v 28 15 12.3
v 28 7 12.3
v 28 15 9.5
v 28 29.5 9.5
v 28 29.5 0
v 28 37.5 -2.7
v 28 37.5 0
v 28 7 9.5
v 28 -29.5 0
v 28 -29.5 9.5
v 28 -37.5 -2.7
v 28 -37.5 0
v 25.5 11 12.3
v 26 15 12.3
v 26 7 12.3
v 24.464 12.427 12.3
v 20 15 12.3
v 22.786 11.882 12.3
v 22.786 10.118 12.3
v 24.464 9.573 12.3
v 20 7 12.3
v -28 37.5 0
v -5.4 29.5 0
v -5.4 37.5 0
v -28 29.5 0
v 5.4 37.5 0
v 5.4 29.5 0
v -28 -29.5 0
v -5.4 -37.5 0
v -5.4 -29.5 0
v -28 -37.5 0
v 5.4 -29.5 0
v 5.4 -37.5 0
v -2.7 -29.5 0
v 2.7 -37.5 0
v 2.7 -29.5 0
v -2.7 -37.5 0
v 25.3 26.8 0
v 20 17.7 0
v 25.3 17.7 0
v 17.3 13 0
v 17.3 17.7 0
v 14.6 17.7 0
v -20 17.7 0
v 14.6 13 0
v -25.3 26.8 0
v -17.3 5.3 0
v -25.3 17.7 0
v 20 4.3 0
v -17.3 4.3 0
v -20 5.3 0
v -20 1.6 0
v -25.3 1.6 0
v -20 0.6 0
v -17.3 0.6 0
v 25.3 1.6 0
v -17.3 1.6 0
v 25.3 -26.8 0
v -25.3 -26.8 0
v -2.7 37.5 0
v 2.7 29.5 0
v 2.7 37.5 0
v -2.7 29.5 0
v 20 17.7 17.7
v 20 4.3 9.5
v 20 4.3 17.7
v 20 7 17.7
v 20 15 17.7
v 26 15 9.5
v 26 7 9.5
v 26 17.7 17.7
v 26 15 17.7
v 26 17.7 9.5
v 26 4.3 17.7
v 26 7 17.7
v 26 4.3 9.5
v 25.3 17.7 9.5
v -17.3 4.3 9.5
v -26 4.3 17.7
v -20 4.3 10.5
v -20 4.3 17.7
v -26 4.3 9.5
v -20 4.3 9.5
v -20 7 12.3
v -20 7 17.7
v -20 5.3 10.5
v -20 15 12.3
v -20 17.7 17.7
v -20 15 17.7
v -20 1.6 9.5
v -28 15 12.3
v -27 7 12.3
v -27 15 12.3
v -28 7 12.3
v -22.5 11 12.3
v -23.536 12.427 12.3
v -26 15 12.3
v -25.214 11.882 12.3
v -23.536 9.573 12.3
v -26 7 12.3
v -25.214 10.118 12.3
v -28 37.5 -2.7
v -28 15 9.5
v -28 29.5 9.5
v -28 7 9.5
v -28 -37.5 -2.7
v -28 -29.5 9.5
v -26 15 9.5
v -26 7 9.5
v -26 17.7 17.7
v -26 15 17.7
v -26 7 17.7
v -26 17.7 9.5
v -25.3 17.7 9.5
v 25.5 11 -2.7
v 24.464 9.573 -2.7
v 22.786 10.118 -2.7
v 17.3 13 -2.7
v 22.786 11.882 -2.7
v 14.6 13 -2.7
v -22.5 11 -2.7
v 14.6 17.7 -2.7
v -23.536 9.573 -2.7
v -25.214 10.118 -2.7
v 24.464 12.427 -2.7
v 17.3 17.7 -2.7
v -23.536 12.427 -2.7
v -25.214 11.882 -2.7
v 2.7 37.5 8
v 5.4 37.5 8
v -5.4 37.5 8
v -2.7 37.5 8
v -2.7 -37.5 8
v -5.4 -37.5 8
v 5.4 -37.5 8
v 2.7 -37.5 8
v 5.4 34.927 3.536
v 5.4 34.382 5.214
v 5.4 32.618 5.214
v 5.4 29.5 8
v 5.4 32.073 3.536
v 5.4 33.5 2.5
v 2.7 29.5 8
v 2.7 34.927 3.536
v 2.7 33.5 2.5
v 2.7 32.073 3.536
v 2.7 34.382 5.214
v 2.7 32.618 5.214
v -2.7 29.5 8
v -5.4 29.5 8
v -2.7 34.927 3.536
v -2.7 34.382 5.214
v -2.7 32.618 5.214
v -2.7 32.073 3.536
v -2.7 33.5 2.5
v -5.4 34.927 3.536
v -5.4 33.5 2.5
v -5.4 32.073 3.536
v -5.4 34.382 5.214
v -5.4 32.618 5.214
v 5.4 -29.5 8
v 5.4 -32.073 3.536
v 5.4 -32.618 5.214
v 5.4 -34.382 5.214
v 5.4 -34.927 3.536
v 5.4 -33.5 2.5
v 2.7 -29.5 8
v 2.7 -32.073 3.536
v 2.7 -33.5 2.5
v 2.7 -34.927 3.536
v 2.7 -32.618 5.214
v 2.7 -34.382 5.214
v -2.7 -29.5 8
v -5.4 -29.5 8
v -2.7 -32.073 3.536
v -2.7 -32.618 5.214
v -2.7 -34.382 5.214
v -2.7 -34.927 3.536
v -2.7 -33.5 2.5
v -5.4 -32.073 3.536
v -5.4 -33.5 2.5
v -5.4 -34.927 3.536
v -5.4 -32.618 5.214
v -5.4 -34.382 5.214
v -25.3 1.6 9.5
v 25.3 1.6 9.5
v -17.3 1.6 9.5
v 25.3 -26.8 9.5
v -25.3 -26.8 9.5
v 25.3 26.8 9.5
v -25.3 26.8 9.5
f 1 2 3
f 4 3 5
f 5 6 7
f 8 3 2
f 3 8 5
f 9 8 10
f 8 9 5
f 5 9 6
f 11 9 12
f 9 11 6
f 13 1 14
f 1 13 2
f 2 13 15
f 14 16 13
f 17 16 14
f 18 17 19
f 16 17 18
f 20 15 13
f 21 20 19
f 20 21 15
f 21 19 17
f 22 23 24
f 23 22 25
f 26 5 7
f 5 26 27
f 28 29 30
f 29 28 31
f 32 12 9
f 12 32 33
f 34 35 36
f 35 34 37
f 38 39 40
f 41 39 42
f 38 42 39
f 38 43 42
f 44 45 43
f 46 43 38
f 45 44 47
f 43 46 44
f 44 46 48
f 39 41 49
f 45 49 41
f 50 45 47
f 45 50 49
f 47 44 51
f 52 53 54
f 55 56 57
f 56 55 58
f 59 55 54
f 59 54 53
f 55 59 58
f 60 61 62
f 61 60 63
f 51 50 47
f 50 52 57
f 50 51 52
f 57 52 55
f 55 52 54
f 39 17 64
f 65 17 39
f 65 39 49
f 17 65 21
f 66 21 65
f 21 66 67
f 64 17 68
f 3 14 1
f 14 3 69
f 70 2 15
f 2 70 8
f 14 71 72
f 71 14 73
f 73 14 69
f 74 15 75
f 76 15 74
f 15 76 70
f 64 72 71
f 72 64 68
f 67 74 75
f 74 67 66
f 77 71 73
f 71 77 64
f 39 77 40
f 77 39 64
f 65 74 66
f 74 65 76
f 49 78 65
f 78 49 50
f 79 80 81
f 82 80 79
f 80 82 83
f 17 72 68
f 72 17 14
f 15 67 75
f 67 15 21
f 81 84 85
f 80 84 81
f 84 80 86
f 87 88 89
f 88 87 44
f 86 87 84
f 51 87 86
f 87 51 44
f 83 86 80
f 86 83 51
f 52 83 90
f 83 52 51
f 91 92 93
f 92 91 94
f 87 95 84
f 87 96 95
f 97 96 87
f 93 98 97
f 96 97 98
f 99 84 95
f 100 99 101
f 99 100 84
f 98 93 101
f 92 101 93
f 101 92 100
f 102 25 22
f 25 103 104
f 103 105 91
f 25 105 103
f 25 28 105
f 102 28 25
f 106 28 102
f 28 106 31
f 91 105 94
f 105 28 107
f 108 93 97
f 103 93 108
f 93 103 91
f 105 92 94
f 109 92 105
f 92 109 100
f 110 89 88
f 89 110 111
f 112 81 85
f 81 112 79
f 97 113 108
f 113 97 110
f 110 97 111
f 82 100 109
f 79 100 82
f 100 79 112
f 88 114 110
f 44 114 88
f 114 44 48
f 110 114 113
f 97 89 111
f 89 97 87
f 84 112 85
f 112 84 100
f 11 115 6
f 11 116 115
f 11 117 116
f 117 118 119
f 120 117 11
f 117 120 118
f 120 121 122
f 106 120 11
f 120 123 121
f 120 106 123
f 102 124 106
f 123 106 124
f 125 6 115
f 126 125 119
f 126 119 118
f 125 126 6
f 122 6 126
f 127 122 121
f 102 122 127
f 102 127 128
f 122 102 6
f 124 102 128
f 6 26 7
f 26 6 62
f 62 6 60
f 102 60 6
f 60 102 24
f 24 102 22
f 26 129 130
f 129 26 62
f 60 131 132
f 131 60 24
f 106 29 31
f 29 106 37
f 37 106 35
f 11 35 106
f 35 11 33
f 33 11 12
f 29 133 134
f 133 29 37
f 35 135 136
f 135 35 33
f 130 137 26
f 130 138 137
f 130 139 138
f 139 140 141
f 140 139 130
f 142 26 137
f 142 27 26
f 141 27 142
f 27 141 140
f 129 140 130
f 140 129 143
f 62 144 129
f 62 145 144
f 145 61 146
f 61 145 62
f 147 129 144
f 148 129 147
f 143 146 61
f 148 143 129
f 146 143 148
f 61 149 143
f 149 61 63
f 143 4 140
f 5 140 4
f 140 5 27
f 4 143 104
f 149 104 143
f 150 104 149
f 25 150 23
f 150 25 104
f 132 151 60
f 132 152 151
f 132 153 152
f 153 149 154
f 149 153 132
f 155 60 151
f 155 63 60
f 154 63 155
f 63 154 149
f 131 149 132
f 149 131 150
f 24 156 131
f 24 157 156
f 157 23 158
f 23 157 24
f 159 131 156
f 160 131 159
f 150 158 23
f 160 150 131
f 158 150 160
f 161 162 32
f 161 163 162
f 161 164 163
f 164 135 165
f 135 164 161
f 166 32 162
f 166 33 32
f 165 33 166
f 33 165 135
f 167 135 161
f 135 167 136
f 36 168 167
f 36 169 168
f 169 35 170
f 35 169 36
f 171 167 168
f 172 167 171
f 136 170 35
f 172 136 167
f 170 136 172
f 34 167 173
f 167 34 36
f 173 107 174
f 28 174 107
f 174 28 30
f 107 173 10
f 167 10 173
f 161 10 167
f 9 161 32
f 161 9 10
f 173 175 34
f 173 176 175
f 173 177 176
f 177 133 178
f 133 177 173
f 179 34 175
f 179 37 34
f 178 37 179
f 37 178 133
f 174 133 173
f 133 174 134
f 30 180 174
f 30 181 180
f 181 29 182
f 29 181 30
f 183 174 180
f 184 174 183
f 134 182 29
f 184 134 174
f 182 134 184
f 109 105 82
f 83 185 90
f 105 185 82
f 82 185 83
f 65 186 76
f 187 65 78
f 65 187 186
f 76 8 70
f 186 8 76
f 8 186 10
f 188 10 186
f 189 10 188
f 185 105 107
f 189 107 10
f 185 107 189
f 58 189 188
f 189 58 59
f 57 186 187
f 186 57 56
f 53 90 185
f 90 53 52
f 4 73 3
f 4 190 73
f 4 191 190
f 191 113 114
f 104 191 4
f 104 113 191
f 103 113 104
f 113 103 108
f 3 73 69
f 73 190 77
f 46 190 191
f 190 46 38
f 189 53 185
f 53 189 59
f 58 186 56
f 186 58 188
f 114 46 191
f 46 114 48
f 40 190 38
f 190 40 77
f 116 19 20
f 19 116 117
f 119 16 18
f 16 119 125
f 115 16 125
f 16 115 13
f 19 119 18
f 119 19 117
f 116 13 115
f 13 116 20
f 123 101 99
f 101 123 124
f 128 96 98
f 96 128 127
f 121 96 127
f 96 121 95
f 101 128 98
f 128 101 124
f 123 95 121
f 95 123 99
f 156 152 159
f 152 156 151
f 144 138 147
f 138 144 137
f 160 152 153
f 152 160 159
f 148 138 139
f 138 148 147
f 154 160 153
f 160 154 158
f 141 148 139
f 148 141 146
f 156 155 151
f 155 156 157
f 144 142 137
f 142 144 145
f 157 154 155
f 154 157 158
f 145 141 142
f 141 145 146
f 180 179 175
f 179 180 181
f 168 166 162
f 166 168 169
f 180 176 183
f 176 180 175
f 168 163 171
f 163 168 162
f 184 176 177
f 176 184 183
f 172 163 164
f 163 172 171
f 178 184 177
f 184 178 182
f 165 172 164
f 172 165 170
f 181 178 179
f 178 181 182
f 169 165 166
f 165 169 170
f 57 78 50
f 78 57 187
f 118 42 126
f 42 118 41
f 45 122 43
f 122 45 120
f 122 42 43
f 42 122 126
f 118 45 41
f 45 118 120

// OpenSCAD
// file: config.scad
//General Config
w_walls=2.7;                //width of the walls
d_screw_h=3;                //screw thread hole
d_screw_p=d_screw_h+0.4;    //screw pass trhougth
h_support=8;                //screw support height
w_support=8;                //screw support width
w_chassis=56;               //chassis with
d_chassis=75;               //chassis depth
h_battery=9.5;              //hight battery

//motor
d_motor=7.6;        //motor diameter
d_motor_shaft=1;    //motor shaft diameter
h_motor=16.60;      //motor height

//motor_housing
w_walls_m=1;                           //with of the walls
gap_housing=3;                         //extra height of the encapsulation
h_motor_body=h_motor+(gap_housing*2);  //motor housing height

//Thrusters
d_motor_t=d_motor+(w_walls_m*2);    //motor support diameter
h_motor_sup=8;                      //motor support height
o_motor=0;                          //motor support distance from ground
d_thruster=34;                      //thruster diameter
h_thruster=30;                      //thruster height

//module propeller
h_propeller=10;     //propeller height
o_propeller=1;      //offset of the blades to shaft
n_blade=3;          //number of blades
s_blade=20;         //angle separation between blades
w_blade=4;          //with of the blades
rounded="empty";      //shape of the blades [round | trian | empty]
// main file
/*
Title:          chassis.scad
Description:    R2B2 nano Chassis
Authors:        Pau Roura (@proura)
Date:           20180611
Version:        0.2
Notes:

    Default values for module chassis

    module chassis(
        d_screw_h=3,        //screw hole diameter
        w_walls=2.7,        //wall with
        w_support=8,        //support with
        h_support=8,        //support depth
        w_chassis=56,       //chassis with
        d_chassis=71,       //chassis depth
        h_battery=9.5
    )
*/
include <config.scad>;

module chassis(d_screw_h=3, w_walls=2.7, w_support=8, h_support=8, w_chassis=56, d_chassis=71, h_battery=9.5){
    difference() {
        union(){
            translate([0,0,-w_walls/2]) cube([w_chassis,d_chassis,w_walls], center=true);

            //Rigth and Left Thrusters supports
            difference(){
                union(){
                    translate([w_chassis/2-w_support,15-h_support,0])          cube([w_support,h_support,12.3]);
                    translate([w_chassis/2-w_support,15-h_support-w_walls,0])  cube([w_support-2,h_support+w_walls*2,12.3+w_walls*2]);
                }
                translate([w_chassis/2-1-w_support,15-h_support,12.3]) cube([w_support+2,h_support,12.3]);
            }

            difference(){
                union(){
                    translate([-w_chassis/2,15-h_support,0])            cube([w_support,h_support,12.3]);
                    translate([-w_chassis/2+2,15-h_support-w_walls,0])  cube([w_support-2,h_support+w_walls*2,12.3+w_walls*2]);
                }
                translate([-w_chassis/2+1,15-h_support,12.3]) cube([w_support+2,h_support,12.3]);
            }

            //Up and Down Thrusters supports
            translate([w_walls,d_chassis/2-w_support,0])     cube([w_walls,w_support,h_support]);
            translate([-w_walls*2,d_chassis/2-w_support,0])  cube([w_walls,w_support,h_support]);
            translate([w_walls,-d_chassis/2,0])              cube([w_walls,w_support,h_support]);
            translate([-w_walls*2,-d_chassis/2,0])           cube([w_walls,w_support,h_support]);

            //battery and power compartments
            translate([-w_chassis/2,-d_chassis/2+w_support,0])          cube ([w_chassis,w_walls,h_battery]);
            translate([-w_chassis/2,15-h_support-w_walls*2,0])          cube ([w_chassis,w_walls,h_battery]);
            translate([-w_chassis/2,d_chassis/2-w_support-w_walls,0])   cube ([w_chassis,w_walls,h_battery]);
            translate([-w_chassis/2,-d_chassis/2+w_support,0])          cube ([w_walls,d_chassis/2+7-h_support,h_battery]);
            translate([w_chassis/2-w_walls,-d_chassis/2+w_support,0])   cube ([w_walls,d_chassis/2+7-h_support,h_battery]);
            translate([-w_chassis/2,15,0])                              cube ([w_walls,d_chassis/2-15-w_support-w_walls,h_battery]);
            translate([w_chassis/2-w_walls,15,0])                       cube ([w_walls,d_chassis/2-15-w_support-w_walls,h_battery]);
        }

        translate([w_chassis/2-w_support/2,15-h_support/2,-w_walls-1])               cylinder(h=30,d=d_screw_h);
        translate([-w_chassis/2+w_support/2,15-h_support/2,-w_walls-1])              cylinder(h=30,d=d_screw_h);
        translate([-14,d_chassis/2-w_support/2,h_support/2])     rotate([0,90,0])    cylinder(h=30,d=d_screw_h);
        translate([-14,-d_chassis/2+w_support/2,h_support/2])    rotate([0,90,0])    cylinder(h=30,d=d_screw_h);

        translate([-w_chassis/2+w_support,15-h_support-w_walls*2-1,0])  cube ([w_walls,w_walls+2,h_battery+1]);
        translate([w_chassis/2-w_support-w_walls*2,13,-w_walls-1])      cube ([w_walls,w_walls+2,w_walls+2]);
    }
}

/*translate([0,0,10])
difference(){
    cube ([w_chassis-4,d_chassis-4,w_walls], center=true);
    difference(){
        union(){
            translate([w_chassis/2-w_support,15-h_support,0])          cube([w_support,h_support,12.3]);
            translate([w_chassis/2-w_support,15-h_support-w_walls,0])  cube([w_support-2,h_support+w_walls*2,12.3+w_walls*2]);
        }
        translate([w_chassis/2-1-w_support,15-h_support,12.3]) cube([w_support+2,h_support,12.3]);
    }

    difference(){
        union(){
            translate([-w_chassis/2,15-h_support,0])             cube([w_support,h_support,12.3]);
            translate([-w_chassis/2+2,15-h_support-w_walls,0])   cube([w_support-2,h_support+w_walls*2,12.3+w_walls*2]);
        }
        translate([-w_chassis/2+1,15-h_support,12.3]) cube([w_support+2,h_support,12.3]);
    }
}*/

//$fn=100;
chassis(d_screw_h, w_walls, w_support, h_support, w_chassis, d_chassis, h_battery);
